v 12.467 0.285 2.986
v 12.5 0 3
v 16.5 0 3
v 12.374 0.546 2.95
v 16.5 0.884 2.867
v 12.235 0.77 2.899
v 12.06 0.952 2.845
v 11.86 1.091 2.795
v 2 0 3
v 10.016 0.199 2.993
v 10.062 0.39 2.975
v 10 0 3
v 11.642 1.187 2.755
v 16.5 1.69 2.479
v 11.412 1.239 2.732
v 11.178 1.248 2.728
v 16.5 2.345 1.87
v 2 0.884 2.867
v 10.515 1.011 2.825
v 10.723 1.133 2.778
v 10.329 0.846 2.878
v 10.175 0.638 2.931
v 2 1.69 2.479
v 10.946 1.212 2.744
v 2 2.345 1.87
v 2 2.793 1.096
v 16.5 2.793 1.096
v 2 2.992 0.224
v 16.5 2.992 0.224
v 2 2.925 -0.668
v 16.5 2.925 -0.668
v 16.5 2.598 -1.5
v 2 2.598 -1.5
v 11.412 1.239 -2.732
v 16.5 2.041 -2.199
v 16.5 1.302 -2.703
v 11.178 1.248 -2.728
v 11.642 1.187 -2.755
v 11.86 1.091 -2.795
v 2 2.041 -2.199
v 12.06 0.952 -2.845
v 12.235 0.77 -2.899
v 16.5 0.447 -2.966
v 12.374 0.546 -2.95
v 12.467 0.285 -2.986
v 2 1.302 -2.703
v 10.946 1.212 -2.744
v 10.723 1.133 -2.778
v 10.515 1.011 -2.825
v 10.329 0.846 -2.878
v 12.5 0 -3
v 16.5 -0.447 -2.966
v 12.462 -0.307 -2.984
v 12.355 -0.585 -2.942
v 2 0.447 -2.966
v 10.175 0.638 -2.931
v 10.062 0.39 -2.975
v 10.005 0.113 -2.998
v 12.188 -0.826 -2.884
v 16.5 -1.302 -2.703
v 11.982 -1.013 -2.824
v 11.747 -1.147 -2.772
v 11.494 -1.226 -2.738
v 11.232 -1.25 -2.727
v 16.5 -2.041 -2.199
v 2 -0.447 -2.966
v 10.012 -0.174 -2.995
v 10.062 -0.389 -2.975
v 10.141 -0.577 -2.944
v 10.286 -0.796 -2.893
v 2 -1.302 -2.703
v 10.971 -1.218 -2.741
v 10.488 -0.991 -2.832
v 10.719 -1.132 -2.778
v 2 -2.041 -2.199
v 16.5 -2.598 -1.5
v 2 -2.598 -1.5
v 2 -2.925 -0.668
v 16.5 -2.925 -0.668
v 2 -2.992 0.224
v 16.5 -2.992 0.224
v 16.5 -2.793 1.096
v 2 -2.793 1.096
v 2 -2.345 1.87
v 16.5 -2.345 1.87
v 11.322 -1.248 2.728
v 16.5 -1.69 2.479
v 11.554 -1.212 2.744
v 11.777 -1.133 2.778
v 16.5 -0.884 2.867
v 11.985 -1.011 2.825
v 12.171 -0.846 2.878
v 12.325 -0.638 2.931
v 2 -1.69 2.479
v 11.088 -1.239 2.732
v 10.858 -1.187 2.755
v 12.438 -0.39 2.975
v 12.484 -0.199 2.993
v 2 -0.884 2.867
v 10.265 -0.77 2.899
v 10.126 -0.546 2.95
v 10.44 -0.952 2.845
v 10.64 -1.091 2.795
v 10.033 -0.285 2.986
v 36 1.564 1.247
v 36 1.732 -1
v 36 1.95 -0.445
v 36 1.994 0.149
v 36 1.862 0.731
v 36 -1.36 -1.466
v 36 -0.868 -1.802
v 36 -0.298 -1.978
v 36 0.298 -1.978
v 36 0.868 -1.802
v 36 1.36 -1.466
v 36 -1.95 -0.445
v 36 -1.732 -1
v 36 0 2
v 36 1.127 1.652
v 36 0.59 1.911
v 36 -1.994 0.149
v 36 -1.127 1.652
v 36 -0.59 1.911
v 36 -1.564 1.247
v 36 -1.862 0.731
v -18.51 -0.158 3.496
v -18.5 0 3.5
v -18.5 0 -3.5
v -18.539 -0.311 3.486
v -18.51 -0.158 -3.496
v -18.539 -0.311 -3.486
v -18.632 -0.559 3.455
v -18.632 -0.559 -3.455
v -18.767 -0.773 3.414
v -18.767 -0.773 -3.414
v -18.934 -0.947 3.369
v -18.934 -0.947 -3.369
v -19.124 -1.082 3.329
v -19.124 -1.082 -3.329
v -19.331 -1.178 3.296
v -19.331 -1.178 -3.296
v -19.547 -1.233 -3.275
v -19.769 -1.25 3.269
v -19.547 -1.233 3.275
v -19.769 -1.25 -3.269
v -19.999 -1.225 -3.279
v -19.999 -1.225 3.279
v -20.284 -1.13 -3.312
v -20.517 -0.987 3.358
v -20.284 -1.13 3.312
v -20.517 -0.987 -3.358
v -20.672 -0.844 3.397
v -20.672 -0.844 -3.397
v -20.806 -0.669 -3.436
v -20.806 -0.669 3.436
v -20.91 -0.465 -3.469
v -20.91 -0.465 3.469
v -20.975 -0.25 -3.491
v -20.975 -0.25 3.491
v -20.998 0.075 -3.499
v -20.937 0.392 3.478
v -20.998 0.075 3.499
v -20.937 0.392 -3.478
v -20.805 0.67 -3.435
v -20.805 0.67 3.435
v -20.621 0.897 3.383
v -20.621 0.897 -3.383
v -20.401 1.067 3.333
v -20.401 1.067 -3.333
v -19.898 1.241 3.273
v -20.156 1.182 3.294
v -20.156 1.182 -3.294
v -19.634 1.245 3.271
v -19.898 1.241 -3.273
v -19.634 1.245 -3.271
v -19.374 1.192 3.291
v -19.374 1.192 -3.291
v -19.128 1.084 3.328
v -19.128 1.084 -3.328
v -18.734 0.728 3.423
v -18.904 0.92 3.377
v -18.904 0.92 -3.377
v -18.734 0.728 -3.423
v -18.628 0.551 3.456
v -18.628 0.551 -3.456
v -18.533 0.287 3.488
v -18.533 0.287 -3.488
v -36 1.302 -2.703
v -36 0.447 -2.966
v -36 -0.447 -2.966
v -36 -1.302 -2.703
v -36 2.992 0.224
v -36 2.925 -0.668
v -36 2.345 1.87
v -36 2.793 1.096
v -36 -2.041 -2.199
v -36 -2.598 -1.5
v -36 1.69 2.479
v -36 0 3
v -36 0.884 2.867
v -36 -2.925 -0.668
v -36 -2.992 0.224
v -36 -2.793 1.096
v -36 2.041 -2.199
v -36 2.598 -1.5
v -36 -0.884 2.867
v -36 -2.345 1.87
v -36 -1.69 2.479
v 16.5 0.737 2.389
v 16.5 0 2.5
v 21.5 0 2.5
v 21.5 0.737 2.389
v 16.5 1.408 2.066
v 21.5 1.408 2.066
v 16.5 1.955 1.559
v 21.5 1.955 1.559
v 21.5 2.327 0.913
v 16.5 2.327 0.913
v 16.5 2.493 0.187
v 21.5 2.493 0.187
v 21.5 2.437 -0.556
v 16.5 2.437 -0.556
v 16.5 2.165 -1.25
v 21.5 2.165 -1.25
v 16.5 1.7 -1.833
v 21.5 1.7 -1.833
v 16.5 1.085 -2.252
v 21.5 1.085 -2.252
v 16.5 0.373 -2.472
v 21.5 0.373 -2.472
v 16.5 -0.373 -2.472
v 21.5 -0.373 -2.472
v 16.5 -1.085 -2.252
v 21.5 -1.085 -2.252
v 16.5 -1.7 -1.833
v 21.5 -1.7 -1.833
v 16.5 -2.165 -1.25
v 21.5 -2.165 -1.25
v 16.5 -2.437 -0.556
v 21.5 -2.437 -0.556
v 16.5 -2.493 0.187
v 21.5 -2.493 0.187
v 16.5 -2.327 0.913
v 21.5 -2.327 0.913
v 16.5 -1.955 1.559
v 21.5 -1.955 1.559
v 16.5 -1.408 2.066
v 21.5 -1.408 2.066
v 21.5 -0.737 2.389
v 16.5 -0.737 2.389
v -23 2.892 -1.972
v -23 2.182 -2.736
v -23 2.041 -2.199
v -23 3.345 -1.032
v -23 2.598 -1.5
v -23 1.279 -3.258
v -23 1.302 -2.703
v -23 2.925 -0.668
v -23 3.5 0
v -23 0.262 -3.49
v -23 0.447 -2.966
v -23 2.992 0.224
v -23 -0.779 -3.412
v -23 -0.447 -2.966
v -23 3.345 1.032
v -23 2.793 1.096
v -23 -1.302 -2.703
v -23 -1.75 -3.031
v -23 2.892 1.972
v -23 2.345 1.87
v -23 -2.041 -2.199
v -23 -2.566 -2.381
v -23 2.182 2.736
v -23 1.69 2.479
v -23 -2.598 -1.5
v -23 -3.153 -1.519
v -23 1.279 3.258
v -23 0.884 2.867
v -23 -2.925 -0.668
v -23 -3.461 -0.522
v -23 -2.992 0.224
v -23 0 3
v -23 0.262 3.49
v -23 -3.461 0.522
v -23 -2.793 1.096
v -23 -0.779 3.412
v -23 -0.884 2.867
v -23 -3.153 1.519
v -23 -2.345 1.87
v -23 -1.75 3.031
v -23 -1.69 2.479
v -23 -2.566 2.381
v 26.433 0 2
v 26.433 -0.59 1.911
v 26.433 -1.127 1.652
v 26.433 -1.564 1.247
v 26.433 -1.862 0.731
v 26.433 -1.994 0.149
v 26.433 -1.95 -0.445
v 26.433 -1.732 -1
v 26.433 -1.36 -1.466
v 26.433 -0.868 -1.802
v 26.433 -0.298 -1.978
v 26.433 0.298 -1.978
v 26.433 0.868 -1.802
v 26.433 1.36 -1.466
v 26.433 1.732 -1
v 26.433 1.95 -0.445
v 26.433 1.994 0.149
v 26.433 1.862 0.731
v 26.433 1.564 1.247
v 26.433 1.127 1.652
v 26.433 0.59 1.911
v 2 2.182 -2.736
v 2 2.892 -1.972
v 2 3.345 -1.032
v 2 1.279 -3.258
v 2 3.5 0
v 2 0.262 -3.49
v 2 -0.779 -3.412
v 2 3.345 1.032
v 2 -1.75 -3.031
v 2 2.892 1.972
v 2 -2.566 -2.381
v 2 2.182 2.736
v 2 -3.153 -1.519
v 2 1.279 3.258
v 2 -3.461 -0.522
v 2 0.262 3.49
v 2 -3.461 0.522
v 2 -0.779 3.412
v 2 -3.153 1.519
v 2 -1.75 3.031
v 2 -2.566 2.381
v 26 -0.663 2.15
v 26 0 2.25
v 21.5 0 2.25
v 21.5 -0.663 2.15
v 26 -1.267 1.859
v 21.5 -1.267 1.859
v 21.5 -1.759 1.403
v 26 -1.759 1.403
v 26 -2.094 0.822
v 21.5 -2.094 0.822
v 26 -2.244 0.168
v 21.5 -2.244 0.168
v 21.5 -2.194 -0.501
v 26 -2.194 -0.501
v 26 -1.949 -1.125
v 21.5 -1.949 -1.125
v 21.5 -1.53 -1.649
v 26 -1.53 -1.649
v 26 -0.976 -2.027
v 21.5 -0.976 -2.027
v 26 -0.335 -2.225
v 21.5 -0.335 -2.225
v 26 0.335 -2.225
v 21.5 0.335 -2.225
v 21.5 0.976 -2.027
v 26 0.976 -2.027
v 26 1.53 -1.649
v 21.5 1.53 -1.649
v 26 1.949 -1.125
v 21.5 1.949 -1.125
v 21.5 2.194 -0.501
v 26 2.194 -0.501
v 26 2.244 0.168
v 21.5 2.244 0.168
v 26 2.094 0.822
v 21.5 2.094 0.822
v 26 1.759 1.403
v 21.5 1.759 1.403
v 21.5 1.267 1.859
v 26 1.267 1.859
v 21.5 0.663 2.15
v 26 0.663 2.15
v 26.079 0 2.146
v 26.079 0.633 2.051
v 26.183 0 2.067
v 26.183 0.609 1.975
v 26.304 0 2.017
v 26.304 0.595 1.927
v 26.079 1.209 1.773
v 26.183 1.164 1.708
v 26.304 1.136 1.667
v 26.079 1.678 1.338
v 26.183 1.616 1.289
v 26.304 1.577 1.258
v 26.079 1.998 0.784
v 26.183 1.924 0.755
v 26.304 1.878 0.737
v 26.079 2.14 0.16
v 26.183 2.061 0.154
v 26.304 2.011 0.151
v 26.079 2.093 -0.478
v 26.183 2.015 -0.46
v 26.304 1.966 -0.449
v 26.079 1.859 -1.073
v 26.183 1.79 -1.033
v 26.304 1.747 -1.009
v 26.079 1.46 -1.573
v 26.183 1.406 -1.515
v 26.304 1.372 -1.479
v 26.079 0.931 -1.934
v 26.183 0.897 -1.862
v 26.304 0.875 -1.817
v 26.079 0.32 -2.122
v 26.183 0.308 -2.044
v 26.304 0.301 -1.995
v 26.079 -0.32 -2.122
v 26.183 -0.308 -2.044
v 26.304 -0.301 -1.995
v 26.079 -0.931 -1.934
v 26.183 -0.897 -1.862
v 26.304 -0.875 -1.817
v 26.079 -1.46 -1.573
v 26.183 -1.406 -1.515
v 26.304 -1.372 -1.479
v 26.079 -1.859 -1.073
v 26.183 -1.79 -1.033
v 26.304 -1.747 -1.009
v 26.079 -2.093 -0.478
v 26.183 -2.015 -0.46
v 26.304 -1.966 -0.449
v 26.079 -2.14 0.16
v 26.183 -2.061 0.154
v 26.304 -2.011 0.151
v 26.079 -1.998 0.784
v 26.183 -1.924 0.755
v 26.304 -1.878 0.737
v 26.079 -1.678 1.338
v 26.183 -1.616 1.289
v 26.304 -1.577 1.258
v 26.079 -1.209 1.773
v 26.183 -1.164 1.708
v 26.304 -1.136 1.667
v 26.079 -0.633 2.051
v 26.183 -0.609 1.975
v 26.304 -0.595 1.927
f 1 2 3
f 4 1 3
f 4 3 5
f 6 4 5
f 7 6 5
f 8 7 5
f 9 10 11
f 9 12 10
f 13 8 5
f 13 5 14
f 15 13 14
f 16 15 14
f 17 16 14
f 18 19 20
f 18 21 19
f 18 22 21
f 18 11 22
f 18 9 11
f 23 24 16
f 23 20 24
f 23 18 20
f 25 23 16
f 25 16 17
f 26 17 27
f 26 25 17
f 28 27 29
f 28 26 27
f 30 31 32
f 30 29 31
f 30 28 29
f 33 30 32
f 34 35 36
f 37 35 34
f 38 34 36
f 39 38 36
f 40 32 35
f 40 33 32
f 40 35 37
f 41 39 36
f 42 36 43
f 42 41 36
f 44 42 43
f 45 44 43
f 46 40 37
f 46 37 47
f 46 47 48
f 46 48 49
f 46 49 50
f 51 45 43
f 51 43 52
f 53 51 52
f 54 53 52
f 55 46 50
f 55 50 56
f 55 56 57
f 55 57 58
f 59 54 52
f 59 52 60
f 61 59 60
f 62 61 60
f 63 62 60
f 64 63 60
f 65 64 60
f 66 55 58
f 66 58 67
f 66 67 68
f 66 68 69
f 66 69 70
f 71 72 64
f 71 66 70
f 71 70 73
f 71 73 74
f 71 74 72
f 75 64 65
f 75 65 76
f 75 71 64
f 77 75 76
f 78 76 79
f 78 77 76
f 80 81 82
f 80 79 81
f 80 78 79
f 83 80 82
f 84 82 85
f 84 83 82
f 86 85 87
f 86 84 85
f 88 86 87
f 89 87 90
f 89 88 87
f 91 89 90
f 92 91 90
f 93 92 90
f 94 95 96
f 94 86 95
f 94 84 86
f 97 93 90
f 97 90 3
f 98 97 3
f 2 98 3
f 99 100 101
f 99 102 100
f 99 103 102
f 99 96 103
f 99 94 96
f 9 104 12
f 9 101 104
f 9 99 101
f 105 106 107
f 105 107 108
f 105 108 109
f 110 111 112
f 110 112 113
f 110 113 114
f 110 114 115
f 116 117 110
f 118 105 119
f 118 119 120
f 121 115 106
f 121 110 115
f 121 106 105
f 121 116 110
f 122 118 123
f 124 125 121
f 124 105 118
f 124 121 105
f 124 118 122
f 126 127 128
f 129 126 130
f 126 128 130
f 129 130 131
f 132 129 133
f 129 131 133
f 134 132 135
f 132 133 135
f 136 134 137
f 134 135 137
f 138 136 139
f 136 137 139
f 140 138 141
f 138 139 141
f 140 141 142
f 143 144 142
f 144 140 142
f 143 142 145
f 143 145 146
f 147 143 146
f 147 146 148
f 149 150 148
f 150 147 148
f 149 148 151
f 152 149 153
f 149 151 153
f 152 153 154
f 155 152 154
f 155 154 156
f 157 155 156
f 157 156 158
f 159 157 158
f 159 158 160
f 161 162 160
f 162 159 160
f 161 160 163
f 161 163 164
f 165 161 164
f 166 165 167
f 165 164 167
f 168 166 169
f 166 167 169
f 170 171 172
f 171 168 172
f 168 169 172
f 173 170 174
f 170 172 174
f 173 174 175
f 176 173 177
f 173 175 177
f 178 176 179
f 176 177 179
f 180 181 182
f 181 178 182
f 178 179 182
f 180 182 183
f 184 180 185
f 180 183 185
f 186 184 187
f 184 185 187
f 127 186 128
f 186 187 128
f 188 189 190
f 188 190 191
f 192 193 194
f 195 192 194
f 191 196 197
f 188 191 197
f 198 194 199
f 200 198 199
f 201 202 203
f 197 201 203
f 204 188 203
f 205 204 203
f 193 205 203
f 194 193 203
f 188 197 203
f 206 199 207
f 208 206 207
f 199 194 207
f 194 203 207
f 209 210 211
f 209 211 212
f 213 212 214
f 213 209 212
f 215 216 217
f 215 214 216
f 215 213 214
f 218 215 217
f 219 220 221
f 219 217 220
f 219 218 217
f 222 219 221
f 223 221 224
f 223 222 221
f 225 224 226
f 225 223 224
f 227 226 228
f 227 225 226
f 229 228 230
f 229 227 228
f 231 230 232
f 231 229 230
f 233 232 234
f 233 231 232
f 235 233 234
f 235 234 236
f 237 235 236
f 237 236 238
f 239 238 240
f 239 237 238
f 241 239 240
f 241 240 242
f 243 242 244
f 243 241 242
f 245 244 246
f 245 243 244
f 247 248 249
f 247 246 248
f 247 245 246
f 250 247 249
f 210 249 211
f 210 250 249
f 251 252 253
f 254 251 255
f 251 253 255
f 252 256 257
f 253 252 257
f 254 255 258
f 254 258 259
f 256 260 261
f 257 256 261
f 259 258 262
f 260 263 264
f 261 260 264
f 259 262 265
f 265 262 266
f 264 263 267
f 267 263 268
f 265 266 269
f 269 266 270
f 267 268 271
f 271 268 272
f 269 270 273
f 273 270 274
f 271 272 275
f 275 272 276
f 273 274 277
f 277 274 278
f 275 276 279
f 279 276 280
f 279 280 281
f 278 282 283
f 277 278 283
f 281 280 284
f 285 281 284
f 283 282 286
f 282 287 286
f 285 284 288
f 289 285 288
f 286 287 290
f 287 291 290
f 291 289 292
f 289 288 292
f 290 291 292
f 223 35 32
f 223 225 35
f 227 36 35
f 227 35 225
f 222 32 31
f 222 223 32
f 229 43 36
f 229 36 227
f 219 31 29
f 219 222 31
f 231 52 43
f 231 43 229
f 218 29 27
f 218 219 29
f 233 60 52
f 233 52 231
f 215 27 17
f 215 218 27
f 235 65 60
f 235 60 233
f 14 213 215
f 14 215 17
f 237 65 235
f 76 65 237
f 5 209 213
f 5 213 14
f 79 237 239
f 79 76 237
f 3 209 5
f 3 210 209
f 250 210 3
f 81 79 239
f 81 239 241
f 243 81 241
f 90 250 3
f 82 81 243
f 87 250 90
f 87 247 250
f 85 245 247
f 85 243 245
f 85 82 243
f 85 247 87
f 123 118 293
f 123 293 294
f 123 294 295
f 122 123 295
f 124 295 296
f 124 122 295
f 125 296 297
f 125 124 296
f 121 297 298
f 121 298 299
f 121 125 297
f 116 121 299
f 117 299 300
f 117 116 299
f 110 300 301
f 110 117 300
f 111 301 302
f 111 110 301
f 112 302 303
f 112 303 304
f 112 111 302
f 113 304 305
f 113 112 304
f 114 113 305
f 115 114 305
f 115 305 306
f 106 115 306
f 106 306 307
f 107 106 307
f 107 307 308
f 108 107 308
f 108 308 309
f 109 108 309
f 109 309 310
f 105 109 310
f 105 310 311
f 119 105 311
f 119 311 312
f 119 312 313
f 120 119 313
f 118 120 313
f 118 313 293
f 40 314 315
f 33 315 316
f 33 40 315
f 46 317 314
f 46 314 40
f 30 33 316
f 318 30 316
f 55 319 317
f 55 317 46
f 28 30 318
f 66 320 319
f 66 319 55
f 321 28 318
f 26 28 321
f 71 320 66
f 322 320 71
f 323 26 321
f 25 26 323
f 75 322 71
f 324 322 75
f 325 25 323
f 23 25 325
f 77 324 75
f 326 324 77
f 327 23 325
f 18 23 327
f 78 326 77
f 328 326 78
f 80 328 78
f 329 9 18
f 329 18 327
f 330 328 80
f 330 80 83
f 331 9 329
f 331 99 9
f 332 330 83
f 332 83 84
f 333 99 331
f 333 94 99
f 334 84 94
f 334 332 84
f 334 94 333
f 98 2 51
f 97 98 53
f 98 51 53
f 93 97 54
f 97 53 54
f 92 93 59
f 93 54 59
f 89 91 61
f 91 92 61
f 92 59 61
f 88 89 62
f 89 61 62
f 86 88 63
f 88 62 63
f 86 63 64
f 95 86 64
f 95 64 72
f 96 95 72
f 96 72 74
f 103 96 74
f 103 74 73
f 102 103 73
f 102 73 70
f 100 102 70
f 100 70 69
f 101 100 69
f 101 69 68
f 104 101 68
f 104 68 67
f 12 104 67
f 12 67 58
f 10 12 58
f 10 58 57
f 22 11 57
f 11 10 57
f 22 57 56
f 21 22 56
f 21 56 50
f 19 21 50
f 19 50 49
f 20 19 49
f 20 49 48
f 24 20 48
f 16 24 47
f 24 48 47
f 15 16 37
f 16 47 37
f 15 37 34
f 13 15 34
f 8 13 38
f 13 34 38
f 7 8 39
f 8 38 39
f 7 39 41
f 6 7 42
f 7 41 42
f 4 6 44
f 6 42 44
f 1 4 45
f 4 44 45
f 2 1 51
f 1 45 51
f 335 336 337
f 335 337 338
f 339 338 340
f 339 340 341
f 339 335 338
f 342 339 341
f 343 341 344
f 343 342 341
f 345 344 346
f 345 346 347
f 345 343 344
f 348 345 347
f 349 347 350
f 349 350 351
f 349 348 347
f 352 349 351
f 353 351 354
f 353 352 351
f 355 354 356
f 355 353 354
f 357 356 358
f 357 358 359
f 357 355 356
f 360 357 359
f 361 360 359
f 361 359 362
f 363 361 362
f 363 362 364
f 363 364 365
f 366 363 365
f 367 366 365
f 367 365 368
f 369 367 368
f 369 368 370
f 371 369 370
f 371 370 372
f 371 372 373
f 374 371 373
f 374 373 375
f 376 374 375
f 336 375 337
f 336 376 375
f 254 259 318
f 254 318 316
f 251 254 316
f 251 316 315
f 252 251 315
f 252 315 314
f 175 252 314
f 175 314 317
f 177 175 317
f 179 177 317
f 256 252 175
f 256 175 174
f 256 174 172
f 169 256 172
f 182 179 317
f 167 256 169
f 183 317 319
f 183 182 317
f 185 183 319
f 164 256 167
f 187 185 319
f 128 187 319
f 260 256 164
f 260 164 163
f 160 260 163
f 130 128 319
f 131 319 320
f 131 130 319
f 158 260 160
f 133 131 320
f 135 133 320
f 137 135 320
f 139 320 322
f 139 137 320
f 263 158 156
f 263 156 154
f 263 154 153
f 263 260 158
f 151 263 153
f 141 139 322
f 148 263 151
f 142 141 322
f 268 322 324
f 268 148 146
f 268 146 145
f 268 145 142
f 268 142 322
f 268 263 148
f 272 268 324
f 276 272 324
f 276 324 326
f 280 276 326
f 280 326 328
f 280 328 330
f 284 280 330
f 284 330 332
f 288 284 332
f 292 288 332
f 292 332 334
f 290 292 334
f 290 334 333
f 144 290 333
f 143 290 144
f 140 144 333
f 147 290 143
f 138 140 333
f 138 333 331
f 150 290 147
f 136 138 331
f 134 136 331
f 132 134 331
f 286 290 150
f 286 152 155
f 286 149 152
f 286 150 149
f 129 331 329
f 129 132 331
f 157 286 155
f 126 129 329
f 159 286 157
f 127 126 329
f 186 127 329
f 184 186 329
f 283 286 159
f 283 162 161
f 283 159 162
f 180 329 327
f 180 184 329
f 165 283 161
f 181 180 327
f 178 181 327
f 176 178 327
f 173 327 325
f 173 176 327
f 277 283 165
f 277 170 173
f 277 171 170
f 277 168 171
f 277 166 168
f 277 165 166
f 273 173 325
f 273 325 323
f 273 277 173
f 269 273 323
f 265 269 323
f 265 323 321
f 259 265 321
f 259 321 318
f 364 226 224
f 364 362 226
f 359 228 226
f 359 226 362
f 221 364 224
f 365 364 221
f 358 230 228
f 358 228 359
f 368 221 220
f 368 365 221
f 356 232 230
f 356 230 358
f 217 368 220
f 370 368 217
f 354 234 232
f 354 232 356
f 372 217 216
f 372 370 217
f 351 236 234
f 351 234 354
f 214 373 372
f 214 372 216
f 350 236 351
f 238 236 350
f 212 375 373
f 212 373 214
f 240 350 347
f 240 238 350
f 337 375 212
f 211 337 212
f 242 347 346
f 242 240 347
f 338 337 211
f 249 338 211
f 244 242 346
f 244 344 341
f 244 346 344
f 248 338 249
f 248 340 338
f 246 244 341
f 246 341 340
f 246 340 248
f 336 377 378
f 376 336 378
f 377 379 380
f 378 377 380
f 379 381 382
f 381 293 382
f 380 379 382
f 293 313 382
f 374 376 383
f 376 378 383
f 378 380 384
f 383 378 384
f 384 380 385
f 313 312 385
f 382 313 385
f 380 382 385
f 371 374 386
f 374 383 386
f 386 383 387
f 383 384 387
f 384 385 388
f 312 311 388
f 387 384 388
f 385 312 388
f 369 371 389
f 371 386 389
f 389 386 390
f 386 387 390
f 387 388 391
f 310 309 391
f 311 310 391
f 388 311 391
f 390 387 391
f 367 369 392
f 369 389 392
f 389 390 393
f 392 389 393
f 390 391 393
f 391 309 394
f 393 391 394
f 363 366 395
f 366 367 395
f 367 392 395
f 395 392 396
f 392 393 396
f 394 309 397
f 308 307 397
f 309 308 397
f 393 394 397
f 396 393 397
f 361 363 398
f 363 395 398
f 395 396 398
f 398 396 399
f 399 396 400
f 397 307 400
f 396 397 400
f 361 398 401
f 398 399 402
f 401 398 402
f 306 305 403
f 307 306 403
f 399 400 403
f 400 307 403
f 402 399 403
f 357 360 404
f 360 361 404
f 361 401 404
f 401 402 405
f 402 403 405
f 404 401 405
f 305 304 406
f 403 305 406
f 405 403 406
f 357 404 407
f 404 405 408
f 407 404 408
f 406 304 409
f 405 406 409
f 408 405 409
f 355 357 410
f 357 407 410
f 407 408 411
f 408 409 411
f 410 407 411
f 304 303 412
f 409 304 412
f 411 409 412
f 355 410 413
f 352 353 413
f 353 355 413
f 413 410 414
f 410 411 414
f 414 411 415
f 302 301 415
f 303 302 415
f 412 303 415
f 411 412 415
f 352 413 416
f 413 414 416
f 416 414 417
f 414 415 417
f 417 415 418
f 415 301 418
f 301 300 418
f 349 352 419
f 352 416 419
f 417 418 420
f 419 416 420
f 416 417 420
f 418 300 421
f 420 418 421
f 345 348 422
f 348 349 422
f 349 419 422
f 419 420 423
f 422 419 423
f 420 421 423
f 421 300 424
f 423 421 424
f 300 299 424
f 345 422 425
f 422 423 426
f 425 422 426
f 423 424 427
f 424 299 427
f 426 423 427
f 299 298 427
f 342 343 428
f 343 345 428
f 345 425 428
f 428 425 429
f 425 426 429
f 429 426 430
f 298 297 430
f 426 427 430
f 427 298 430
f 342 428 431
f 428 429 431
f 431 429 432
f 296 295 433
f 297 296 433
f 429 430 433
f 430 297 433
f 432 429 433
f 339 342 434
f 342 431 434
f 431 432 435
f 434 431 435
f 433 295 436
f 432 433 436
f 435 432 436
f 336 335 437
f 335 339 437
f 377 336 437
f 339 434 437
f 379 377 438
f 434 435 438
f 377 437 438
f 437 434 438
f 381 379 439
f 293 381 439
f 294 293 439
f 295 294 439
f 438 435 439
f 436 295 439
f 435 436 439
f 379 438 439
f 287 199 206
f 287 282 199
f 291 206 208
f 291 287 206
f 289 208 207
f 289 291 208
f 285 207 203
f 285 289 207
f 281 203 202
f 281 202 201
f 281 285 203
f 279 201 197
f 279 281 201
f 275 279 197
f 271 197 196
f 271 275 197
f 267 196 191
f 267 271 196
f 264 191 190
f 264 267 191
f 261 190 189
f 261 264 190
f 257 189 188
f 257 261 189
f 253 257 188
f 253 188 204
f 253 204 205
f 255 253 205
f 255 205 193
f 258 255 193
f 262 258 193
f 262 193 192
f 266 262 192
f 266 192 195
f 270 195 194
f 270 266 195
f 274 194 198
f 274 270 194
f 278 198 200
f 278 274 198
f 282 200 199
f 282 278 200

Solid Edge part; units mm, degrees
sketch "Sketch1" plane through (0, 0, 0) normal (1, 0, 0) x (0, 1, 0)
  circle A0 centre (0, 0) radius 3.5
  dimension "D1" = 7
extrude "Protrusion1" add sketch "Sketch1" along normal mid plane 72
sketch "Sketch2" plane through (0, 0, 0) normal (0, -1, 0) x (1, 0, 0)
  line L0 (-36, 3) -> (-23, 3)
  line L1 (-23, 3) -> (-23, 3.5)
  dimension "D1" = 13
revolve "RevolvedCutout1" cut sketch "Sketch2" angle 360 about axis through (-60, 0, 0) along (1, 0, 0) material side at (-29.5, 0, 3.05)
sketch "Sketch3" plane through (0, 0, 0) normal (0, -1, 0) x (1, 0, 0)
  line L0 (36, 3) -> (2, 3)
  line L1 (2, 3) -> (2, 3.5)
  dimension "D1" = 34
revolve "RevolvedCutout2" cut sketch "Sketch3" angle 360 about axis through (-60, 0, 0) along (1, 0, 0) material side at (19, 0, 3.05)
sketch "Sketch4" plane through (0, 0, 0) normal (0, -1, 0) x (1, 0, 0)
  line L0 (16.5, 2.5) -> (16.5, 3)
  line L1 (21.5, 2.5) -> (16.5, 2.5)
  line L2 (21.5, 2.25) -> (21.5, 2.5)
  line L3 (21.5, 2.25) -> (26, 2.25)
  line L4 (26, 2.25) -> (26, 2)
  line L5 (26, 2) -> (36, 2)
  dimension "D1" = 19.5
  dimension "D2" = 14.5
  dimension "D3" = 10
revolve "RevolvedCutout3" cut sketch "Sketch4" angle 360 about axis through (-60, 0, 0) along (1, 0, 0) material side at (16.55, 0, 2.75)
cosmetic_thread "Gewinde_1" size "M4" thread depth 9.5
fillet "Verrundung_2" radius 0.5 1 edges at (26, 0, -2)
sketch "Sketch5" plane through (0, 0, 0) normal (0, 0, 1) x (1, 0, 0)
  circle A0 centre (-19.75, 0) radius 1.25
  dimension "D1" = 2.5
  dimension "D2" = 15
extrude "Cutout1" cut sketch "Sketch5" along normal up to next and the other way up to next
sketch "Sketch6" plane through (0, 0, 0) normal (0, 0, 1) x (1, 0, 0)
  circle A0 centre (11.25, 0) radius 1.25
  dimension "D1" = 46
extrude "Cutout2" cut sketch "Sketch6" along normal up to next and the other way up to next
properties material "Stahl - Unlegierter:1.1191 , C45E"
